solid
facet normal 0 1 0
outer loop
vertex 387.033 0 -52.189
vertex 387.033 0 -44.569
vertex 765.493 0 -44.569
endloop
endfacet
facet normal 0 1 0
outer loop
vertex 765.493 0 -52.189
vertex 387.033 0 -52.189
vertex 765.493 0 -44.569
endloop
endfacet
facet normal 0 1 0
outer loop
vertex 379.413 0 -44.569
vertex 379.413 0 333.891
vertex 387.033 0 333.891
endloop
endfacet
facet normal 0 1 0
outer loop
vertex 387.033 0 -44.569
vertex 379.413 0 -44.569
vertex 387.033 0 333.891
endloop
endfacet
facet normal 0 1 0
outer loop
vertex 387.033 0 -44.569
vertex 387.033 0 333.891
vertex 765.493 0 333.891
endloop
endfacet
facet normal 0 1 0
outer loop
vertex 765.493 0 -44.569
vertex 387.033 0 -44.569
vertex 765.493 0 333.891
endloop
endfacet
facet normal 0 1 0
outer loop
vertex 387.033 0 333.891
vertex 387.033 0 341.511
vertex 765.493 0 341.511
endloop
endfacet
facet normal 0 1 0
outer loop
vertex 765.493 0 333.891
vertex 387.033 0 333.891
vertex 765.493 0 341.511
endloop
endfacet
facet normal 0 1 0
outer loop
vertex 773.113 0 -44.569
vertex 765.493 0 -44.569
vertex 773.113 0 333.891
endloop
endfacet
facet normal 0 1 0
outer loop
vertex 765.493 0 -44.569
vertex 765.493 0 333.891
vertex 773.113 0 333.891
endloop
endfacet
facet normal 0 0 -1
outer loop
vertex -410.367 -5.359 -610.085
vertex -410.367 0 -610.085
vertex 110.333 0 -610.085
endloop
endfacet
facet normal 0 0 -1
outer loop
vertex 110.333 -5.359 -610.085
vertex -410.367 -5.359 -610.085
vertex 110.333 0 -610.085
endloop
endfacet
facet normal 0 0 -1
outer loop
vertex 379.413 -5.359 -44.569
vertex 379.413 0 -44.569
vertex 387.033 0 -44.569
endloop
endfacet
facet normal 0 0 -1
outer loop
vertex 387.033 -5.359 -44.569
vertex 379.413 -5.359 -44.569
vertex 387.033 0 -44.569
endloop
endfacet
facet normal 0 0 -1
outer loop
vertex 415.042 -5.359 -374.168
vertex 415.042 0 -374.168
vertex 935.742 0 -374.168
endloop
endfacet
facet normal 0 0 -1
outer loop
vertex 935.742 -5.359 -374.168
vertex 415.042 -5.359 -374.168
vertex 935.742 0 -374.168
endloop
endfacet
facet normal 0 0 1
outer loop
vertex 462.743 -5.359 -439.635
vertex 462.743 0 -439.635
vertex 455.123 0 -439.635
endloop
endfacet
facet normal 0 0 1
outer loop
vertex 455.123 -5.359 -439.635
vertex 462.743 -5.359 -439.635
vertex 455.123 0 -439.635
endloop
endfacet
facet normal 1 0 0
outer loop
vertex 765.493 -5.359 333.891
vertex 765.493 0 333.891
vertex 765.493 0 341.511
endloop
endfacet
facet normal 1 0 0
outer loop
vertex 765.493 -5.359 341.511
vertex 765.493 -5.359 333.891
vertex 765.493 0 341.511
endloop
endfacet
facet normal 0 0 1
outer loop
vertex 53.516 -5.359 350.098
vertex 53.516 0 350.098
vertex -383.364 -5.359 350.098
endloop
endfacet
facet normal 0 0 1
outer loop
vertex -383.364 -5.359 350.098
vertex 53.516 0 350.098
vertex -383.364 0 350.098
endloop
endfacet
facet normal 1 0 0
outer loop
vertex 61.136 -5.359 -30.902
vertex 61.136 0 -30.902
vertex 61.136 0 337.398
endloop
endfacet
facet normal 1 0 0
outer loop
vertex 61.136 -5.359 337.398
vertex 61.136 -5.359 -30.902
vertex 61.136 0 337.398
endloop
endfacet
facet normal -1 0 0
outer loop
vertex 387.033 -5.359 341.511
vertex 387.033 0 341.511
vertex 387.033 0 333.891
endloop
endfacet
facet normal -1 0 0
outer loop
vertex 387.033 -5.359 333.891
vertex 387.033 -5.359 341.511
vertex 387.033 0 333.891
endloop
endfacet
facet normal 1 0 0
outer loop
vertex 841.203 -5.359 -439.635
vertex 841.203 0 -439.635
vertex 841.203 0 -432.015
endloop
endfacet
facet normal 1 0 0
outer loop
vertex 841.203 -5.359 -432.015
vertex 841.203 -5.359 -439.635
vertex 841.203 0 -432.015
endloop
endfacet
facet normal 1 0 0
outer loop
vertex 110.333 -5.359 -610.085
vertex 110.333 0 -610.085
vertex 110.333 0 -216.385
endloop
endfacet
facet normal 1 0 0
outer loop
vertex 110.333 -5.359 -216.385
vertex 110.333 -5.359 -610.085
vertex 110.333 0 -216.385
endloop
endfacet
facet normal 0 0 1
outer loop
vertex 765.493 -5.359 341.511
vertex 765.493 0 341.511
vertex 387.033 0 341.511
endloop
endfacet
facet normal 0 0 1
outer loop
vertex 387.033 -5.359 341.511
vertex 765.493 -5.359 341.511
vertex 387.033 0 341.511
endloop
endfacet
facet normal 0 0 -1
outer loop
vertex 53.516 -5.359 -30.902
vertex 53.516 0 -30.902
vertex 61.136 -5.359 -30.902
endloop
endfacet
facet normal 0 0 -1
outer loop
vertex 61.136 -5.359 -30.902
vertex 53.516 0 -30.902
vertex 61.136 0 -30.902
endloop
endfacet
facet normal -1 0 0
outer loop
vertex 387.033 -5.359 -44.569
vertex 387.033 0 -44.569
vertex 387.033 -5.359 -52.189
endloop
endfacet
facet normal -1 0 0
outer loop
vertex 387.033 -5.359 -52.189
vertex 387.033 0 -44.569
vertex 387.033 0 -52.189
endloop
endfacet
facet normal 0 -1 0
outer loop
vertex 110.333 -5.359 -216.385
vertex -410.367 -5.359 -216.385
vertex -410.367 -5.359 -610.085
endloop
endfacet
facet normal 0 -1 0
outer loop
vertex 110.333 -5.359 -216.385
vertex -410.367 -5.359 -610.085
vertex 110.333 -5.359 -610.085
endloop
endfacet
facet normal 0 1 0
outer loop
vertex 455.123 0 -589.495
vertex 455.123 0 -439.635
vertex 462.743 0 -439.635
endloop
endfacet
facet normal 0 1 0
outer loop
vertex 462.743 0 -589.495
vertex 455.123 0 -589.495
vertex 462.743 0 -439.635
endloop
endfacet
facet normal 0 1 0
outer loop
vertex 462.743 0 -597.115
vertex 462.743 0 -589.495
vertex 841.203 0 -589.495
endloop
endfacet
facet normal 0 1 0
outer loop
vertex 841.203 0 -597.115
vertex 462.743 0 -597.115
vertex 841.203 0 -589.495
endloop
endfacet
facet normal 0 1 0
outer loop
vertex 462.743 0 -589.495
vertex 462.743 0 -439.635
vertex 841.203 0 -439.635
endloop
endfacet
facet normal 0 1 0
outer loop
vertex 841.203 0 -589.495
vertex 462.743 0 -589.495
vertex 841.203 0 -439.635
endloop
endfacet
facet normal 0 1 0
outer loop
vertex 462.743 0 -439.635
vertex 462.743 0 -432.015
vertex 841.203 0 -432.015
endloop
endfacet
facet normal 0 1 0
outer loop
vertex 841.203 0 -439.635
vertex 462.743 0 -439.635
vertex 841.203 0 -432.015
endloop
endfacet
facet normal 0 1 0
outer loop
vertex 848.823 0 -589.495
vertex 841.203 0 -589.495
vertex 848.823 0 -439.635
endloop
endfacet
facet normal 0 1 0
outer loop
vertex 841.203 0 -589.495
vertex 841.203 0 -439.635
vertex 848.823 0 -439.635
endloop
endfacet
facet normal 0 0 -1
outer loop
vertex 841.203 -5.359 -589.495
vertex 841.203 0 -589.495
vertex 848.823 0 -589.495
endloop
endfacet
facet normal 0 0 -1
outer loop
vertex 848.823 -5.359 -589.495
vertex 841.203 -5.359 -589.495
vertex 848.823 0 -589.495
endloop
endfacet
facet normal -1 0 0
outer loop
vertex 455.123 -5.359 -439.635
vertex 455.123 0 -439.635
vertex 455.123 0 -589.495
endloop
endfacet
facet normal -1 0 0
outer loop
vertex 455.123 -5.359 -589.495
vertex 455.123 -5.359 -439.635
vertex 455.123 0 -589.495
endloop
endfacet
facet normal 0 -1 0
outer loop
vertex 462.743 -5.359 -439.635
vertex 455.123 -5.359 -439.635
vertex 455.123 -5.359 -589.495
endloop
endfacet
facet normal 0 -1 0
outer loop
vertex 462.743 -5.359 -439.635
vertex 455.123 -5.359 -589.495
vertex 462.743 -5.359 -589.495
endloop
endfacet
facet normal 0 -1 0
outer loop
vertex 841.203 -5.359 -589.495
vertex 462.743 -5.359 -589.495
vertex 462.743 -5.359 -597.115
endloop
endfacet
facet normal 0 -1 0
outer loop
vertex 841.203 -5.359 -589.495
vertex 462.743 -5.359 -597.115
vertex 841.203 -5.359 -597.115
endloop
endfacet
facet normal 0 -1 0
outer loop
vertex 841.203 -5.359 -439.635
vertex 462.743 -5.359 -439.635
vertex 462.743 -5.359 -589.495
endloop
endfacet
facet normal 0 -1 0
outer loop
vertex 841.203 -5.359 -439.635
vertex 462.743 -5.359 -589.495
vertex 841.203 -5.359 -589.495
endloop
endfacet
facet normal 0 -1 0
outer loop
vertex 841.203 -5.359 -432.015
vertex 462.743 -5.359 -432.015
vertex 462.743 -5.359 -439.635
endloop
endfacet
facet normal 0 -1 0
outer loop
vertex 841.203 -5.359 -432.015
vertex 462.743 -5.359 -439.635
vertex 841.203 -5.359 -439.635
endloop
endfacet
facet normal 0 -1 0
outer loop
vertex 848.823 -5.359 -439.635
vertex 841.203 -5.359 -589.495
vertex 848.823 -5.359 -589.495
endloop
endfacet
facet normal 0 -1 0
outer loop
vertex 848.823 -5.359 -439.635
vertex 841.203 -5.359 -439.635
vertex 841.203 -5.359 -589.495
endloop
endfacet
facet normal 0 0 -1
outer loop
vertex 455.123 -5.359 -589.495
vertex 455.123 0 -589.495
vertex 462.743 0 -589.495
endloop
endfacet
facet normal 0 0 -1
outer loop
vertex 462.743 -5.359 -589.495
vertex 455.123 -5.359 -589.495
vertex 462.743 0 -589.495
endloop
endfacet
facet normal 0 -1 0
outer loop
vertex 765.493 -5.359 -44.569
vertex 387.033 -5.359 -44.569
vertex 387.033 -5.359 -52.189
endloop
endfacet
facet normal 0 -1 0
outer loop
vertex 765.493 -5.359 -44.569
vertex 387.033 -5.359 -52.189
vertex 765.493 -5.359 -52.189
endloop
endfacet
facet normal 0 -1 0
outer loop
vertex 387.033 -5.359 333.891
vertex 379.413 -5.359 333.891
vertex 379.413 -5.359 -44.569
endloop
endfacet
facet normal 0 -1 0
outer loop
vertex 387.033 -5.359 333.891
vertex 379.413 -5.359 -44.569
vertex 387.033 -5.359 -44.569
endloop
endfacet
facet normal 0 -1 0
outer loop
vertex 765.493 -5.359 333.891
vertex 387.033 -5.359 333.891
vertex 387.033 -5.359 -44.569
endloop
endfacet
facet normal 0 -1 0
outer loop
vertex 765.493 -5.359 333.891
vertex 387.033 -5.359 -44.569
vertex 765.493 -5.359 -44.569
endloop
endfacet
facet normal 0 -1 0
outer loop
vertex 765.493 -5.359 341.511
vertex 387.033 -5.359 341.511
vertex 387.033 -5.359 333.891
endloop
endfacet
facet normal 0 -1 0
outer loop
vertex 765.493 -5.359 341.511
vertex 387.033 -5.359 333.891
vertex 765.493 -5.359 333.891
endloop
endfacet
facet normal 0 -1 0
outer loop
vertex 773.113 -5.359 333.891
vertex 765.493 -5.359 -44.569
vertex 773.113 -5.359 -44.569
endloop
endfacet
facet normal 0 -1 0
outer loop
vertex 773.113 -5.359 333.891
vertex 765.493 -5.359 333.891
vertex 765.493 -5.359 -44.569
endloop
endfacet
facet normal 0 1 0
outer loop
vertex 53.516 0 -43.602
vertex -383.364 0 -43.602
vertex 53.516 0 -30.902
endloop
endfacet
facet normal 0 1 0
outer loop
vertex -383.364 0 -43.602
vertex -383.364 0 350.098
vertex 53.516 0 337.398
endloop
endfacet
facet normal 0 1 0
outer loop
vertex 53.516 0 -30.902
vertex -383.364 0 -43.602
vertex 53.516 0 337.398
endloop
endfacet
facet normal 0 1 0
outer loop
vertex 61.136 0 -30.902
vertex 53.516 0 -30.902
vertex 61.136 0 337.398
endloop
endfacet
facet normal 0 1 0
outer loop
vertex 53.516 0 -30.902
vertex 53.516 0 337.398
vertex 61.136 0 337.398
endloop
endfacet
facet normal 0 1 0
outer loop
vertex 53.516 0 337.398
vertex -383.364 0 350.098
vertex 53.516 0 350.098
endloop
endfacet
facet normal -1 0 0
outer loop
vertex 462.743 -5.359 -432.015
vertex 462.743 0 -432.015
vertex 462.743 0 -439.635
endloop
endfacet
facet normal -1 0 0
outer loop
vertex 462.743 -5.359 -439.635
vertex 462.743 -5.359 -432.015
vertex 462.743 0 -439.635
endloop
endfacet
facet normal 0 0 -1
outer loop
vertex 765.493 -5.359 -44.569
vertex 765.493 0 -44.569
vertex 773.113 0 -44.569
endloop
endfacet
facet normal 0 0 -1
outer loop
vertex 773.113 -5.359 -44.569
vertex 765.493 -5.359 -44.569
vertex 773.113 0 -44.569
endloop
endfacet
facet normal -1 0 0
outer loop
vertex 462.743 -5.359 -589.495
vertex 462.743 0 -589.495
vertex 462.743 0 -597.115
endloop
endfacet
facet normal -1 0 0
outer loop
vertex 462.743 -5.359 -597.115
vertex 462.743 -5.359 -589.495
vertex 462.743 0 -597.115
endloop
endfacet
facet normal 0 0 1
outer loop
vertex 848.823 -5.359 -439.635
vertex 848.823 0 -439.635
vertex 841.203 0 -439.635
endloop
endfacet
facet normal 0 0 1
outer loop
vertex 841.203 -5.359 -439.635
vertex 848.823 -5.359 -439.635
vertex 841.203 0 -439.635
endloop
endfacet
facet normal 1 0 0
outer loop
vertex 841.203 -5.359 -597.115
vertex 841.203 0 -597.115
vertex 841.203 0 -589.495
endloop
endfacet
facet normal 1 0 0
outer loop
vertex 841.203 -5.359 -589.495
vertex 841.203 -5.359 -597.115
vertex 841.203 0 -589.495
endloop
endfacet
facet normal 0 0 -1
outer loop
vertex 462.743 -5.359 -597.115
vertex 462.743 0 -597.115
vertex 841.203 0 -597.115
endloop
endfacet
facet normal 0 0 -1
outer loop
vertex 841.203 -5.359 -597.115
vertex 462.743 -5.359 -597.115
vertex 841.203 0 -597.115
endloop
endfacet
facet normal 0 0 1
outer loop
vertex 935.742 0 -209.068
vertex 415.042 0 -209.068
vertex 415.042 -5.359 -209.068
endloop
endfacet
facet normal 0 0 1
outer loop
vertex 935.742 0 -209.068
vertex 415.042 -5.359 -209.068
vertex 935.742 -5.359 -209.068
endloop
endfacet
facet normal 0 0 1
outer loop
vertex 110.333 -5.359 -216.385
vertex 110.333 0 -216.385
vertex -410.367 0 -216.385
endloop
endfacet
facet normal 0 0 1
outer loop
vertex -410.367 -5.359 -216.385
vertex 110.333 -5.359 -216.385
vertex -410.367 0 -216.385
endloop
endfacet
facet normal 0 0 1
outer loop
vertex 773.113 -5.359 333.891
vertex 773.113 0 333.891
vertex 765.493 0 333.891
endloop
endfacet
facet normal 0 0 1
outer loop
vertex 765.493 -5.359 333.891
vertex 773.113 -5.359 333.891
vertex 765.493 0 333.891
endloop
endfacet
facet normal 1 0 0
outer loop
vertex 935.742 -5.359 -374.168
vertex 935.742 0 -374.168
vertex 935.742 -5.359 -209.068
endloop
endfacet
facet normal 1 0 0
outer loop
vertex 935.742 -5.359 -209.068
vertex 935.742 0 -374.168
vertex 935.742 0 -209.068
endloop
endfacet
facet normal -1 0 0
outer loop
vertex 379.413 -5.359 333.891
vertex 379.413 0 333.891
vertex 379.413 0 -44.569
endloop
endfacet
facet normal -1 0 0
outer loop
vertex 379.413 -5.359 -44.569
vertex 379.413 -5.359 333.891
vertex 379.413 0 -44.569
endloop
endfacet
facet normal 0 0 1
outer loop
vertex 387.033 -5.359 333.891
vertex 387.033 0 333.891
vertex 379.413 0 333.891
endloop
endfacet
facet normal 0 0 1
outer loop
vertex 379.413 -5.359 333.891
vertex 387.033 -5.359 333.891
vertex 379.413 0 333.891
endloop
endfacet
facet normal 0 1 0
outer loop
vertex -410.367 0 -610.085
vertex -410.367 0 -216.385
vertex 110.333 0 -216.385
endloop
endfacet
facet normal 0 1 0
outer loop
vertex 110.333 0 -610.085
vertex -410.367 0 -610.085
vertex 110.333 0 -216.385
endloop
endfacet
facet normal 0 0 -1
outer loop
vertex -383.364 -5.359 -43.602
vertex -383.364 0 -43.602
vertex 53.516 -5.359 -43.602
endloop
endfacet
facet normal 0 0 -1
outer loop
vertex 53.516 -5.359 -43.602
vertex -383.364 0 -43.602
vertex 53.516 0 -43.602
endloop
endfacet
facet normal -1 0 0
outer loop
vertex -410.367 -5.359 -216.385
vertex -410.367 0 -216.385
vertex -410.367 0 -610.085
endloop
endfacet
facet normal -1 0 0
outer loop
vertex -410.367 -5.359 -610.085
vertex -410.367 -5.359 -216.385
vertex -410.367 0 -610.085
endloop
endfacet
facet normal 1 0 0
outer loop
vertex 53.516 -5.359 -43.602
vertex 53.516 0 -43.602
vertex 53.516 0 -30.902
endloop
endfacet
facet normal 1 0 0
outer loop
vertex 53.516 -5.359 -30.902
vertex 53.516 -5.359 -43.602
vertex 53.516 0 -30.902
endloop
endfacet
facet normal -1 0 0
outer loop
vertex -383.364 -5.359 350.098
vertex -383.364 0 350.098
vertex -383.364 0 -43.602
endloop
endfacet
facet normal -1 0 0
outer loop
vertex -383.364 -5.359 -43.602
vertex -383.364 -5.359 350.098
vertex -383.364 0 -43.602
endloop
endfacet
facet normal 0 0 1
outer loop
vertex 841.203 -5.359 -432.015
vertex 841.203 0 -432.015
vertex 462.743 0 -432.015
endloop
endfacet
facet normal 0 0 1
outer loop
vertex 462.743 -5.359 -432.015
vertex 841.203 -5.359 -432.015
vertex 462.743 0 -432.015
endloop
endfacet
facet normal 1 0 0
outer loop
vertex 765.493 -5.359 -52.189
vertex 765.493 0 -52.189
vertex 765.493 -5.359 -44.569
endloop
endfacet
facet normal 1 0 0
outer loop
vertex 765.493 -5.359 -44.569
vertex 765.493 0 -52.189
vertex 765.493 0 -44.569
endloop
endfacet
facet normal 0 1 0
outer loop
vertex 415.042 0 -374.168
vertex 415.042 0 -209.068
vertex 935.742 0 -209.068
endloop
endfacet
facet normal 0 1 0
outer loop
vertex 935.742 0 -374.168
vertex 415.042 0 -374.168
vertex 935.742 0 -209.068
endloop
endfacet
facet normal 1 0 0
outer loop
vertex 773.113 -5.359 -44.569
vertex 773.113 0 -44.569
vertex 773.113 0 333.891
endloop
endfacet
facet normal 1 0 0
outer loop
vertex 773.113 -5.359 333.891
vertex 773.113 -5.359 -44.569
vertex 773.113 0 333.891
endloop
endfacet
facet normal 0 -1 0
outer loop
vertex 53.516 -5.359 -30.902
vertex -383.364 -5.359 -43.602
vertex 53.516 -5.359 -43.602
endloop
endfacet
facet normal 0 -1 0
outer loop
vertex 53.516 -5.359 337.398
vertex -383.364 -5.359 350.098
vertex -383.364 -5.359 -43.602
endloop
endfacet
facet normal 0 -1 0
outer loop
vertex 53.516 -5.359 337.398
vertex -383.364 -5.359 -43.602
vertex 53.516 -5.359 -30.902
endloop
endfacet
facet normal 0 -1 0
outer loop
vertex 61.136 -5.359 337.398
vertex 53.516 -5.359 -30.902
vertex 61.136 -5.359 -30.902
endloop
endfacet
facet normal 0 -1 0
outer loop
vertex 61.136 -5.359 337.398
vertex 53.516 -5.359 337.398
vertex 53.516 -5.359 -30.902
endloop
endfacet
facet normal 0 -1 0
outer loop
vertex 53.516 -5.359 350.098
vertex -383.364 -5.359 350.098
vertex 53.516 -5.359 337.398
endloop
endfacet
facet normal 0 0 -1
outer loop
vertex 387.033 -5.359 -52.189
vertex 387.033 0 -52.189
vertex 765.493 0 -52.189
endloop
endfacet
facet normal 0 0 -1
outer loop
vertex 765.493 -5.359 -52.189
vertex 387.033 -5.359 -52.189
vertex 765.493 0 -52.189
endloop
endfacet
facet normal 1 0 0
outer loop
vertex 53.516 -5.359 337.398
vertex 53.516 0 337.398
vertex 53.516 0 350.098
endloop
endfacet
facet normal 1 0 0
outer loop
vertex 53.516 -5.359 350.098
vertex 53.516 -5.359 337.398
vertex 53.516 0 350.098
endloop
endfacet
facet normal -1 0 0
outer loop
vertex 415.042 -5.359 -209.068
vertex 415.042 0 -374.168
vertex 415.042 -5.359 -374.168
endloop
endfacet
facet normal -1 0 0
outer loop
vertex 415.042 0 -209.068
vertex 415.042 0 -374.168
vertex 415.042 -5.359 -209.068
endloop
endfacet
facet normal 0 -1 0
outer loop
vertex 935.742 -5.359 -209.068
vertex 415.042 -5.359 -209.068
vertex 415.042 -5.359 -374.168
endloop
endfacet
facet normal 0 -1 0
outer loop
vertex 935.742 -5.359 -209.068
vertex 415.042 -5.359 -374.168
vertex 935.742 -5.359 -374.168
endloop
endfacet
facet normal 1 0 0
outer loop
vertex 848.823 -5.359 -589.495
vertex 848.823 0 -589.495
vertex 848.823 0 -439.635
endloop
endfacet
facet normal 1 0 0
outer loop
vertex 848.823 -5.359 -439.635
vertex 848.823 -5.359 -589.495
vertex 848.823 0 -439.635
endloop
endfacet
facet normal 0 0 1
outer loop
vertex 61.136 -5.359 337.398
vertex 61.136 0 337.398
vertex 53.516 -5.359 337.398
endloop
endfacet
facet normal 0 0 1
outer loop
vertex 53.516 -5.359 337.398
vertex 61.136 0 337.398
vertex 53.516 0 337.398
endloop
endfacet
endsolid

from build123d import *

# Parameters (mm, degrees)
F1_DEPTH = 5.3594
F3_DEPTH = 5.3594
F4_W     = 7.62
F4_H     = 7.62
F5_DEPTH = 5.3594
F7_DEPTH = 5.3594
F8_W     = 520.7
F8_H     = 165.1
F9_DEPTH = 5.3594


with BuildPart() as f1:
    # F0 (on Front) → F1 (new body)
    with BuildSketch(Plane.XZ):
        Polygon((53.515951, 350.097552), (-383.364049, 350.097552), (-383.364049, -43.602448), (53.515951, -43.602448), (53.515951, -30.902448), (61.135951, -30.902448), (61.135951, 337.397552), (53.515951, 337.397552), align=None)
    extrude(amount=F1_DEPTH)


with BuildPart() as f3:
    # F2 (on Front) → F3 (new body)
    with BuildSketch(Plane.XZ):
        Polygon((765.49283, 341.510952), (387.03283, 341.510952), (387.03283, 333.890952), (379.41283, 333.890952), (379.41283, -44.569048), (387.03283, -44.569048), (387.03283, -52.189048), (765.49283, -52.189048), (765.49283, -44.569048), (773.11283, -44.569048), (773.11283, 333.890952), (765.49283, 333.890952), align=None)
    extrude(amount=F3_DEPTH)


with BuildPart() as f5:
    # F4 (on Front) → F5 (new body)
    with BuildSketch(Plane.XZ):
        Polygon((102.713063, -216.384772), (-402.746937, -216.384772), (-402.746937, -224.004772), (-410.366937, -224.004772), (-410.366937, -602.464772), (-402.746937, -602.464772), (-402.746937, -610.084772), (102.713063, -610.084772), (102.713063, -602.464772), (110.333063, -602.464772), (110.333063, -224.004772), (102.713063, -224.004772), align=None)
        with Locations((-406.556937, -220.194772)):
            Rectangle(F4_W, F4_H)
        with Locations((-406.556937, -606.274772)):
            Rectangle(F4_W, F4_H)
        with Locations((106.523063, -606.274772)):
            Rectangle(F4_W, F4_H)
        with Locations((106.523063, -220.194772)):
            Rectangle(F4_W, F4_H)
    extrude(amount=F5_DEPTH)


with BuildPart() as f7:
    # F6 (on Front) → F7 (new body)
    with BuildSketch(Plane.XZ):
        Polygon((841.202832, -432.014801), (462.742832, -432.014801), (462.742832, -439.634801), (455.122832, -439.634801), (455.122832, -589.494801), (462.742832, -589.494801), (462.742832, -597.114801), (841.202832, -597.114801), (841.202832, -589.494801), (848.822832, -589.494801), (848.822832, -439.634801), (841.202832, -439.634801), align=None)
    extrude(amount=F7_DEPTH)


with BuildPart() as f9:
    # F8 (on Front) → F9 (new body)
    with BuildSketch(Plane.XZ):
        with Locations((675.392259, -291.617711)):
            Rectangle(F8_W, F8_H)
    extrude(amount=F9_DEPTH)


solid = Compound([f1.part, f3.part, f5.part, f7.part, f9.part])
